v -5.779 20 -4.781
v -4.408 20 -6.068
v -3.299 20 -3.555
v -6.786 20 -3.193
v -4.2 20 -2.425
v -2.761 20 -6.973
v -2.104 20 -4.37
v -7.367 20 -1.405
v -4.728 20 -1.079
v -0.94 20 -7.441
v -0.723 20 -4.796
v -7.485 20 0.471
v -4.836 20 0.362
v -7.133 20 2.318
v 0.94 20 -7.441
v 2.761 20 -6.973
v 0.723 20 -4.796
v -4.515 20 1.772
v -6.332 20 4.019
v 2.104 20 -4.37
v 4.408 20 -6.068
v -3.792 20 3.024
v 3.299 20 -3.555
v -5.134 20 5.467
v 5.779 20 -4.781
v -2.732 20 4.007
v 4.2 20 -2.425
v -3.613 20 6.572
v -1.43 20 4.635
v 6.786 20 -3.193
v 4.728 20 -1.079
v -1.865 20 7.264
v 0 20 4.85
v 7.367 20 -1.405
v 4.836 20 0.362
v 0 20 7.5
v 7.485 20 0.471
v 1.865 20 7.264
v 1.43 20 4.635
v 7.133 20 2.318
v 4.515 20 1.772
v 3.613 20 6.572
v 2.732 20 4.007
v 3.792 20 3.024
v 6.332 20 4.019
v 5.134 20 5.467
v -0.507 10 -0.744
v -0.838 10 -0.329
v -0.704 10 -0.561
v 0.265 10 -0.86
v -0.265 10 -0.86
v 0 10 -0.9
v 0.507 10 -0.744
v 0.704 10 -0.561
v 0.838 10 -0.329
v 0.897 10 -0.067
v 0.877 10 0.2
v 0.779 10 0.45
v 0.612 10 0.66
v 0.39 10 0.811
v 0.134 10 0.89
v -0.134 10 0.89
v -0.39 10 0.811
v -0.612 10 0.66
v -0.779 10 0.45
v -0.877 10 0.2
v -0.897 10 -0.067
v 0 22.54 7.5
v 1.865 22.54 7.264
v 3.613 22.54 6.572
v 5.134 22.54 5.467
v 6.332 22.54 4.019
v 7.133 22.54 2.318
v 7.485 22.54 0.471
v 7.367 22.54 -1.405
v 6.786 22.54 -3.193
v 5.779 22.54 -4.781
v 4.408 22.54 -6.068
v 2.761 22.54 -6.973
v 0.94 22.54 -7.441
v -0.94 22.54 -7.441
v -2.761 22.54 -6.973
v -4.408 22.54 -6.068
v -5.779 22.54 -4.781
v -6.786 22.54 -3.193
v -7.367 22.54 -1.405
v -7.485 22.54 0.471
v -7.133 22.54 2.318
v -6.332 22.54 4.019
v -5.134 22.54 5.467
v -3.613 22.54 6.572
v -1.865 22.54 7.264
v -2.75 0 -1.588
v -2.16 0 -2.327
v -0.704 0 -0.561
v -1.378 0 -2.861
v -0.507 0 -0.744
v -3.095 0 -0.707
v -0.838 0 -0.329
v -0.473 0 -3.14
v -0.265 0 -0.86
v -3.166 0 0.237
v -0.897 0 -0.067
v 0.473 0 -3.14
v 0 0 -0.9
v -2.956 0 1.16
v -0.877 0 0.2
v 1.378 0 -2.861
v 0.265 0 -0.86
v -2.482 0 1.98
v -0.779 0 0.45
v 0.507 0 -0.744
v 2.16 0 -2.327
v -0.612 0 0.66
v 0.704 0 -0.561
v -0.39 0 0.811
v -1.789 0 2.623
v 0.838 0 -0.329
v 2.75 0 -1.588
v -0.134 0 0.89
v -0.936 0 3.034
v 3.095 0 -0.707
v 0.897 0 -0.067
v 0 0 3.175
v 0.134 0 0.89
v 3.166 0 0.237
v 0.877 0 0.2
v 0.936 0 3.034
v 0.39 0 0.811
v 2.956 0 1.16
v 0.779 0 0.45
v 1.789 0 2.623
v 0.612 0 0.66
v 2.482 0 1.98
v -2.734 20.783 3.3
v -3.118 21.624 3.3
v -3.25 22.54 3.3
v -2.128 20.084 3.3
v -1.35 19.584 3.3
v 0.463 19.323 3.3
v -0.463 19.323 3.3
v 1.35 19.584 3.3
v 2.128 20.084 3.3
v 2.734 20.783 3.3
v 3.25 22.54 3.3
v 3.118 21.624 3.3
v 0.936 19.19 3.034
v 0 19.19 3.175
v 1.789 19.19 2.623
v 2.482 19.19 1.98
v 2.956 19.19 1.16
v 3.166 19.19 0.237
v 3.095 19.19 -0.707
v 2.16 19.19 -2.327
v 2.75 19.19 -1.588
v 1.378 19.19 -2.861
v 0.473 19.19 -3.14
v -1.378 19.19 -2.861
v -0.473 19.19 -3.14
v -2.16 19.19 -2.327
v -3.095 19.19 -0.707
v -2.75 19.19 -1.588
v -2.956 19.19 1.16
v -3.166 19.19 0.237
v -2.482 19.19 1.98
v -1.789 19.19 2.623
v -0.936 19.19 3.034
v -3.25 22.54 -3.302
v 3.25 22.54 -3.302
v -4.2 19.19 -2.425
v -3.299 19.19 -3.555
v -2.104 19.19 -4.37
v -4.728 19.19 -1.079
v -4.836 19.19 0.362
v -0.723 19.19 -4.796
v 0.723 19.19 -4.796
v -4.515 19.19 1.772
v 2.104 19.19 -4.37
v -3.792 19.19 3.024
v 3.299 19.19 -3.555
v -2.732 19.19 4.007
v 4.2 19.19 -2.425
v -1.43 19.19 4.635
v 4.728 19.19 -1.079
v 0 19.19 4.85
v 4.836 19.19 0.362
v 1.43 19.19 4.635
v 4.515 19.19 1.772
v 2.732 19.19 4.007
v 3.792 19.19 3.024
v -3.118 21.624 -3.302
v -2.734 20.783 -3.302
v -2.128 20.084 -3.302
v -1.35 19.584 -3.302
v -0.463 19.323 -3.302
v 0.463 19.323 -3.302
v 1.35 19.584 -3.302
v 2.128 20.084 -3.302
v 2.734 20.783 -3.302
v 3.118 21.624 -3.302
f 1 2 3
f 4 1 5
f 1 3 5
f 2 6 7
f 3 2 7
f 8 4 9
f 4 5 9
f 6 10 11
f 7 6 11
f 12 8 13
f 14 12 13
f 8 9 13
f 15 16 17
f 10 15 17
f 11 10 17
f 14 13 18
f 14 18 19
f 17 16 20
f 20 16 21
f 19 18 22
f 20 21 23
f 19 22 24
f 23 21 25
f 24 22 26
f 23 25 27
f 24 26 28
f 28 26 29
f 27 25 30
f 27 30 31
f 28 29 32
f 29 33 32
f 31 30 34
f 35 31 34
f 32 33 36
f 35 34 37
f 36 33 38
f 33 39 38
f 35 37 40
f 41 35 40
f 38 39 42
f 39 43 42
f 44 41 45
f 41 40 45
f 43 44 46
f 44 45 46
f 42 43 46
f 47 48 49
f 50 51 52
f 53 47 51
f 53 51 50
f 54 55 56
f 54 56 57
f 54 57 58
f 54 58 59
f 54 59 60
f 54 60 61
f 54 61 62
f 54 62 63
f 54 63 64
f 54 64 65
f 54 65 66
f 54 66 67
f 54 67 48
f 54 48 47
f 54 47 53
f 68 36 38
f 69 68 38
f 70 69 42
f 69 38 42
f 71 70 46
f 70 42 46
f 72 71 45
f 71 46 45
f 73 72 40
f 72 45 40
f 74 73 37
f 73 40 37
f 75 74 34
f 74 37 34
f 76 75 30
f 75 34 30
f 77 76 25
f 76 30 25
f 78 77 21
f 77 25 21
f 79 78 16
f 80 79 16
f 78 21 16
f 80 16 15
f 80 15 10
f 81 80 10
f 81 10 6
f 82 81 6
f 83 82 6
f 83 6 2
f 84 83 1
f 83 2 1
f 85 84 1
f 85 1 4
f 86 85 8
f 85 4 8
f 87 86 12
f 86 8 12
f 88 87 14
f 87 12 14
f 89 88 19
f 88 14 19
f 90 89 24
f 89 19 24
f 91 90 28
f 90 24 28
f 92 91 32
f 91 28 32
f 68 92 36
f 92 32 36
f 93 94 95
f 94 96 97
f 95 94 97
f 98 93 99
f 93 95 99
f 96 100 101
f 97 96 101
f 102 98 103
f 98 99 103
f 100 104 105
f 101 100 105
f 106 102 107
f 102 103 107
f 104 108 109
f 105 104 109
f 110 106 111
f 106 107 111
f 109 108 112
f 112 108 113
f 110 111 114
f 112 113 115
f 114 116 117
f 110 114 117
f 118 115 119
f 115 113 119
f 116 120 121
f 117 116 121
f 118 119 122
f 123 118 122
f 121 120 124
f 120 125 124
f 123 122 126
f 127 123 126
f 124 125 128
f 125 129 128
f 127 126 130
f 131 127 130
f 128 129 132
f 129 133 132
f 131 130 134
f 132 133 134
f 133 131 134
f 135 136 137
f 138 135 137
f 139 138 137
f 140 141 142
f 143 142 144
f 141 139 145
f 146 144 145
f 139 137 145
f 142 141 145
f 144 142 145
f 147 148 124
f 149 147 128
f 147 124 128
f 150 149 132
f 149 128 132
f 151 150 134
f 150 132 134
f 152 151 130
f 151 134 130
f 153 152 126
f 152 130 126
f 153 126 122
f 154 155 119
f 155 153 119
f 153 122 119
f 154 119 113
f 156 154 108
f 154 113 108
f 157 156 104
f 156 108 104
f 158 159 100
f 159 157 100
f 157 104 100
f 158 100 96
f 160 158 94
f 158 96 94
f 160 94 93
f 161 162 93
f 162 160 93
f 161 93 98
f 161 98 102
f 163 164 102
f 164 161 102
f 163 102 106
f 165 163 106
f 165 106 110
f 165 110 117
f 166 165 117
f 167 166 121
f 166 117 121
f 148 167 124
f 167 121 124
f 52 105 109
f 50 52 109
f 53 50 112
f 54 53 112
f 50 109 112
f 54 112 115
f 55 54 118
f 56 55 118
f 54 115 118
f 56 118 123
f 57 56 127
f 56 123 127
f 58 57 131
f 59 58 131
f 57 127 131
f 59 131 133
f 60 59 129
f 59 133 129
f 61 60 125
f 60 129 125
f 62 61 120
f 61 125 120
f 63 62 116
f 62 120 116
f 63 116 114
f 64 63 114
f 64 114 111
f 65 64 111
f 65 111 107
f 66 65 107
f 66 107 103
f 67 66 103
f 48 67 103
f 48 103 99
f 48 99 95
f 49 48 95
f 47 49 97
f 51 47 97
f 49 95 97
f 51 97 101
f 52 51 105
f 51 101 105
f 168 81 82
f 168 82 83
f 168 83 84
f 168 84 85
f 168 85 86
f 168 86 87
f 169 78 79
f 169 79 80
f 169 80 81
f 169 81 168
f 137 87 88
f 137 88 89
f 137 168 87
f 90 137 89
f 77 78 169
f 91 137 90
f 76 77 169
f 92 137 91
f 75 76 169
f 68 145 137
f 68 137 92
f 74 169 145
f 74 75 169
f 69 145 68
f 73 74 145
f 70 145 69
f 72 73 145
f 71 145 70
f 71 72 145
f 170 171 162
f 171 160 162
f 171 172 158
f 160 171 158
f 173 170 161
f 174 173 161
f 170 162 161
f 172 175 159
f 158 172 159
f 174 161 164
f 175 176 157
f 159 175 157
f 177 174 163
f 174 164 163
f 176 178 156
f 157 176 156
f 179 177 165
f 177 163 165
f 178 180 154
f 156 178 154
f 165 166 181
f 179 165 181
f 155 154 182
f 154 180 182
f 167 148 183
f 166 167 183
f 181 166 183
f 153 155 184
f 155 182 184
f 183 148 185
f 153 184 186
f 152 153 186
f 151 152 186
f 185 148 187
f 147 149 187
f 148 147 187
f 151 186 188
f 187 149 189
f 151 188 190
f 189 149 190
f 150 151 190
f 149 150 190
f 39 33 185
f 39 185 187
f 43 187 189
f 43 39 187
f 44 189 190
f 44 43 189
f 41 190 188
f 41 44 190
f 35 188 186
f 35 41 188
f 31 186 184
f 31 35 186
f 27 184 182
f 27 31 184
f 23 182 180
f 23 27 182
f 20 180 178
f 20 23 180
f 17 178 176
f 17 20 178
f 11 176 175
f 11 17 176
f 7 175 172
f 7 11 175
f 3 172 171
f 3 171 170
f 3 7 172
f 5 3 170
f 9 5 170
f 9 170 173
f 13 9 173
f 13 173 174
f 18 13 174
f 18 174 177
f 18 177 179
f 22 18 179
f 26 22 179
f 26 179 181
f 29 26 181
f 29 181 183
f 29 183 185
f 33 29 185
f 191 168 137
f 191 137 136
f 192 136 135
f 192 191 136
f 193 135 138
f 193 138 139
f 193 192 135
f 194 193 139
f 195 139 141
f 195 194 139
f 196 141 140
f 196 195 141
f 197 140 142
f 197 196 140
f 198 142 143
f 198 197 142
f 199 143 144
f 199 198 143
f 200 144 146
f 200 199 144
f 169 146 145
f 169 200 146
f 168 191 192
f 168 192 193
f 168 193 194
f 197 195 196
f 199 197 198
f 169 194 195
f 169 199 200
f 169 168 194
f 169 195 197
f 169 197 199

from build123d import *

# Parameters (mm, degrees)
SKETCH1_R               = 3.175
BOSS_EXTRUDE1_DEPTH     = 20
SKETCH2_R               = 0.9
CUT_EXTRUDE1_DEPTH      = 10
SKETCH4_R               = 7.5
BOSS_EXTRUDE2_DEPTH     = 2.54
SKETCH6_R               = 4.85
BOSS_EXTRUDE3_DEPTH     = 3.35
CUT_EXTRUDE3_DEPTH      = 3.3
CUT_EXTRUDE3_DEPTH_BACK = 3.302
SKETCH5_R               = 3.25


with BuildPart() as part:
    # Sketch1 → Boss-Extrude1 (new body)
    with BuildSketch(Plane(origin=(0, 0, 0), x_dir=(1, 0, 0), z_dir=(0, 1, 0))):
        with Locations(Location((0, 0, 0), (0, 0, 270))):
            Circle(SKETCH1_R)
    extrude(amount=BOSS_EXTRUDE1_DEPTH)

    # Sketch2 → Cut-Extrude1 (cut)
    with BuildSketch(Plane.XZ):
        with Locations(Location((0, 0, 0), (0, 0, 270))):
            Circle(SKETCH2_R)
    extrude(amount=-CUT_EXTRUDE1_DEPTH, mode=Mode.SUBTRACT)

    # Sketch4 → Boss-Extrude2 (add)
    with BuildSketch(Plane(origin=(0, 20, 0), x_dir=(1, 0, 0), z_dir=(0, 1, 0))):
        with Locations(Location((0, 0, 0), (0, 0, 270))):
            Circle(SKETCH4_R)
    extrude(amount=BOSS_EXTRUDE2_DEPTH)

    # Sketch6 → Boss-Extrude3 (add)
    with BuildSketch(Plane(origin=(0, 22.54, 0), x_dir=(1, 0, 0), z_dir=(0, 1, 0))):
        with Locations(Location((0, 0, 0), (0, 0, 270))):
            Circle(SKETCH6_R)
    extrude(amount=-BOSS_EXTRUDE3_DEPTH)

    # Sketch5 → Cut-Extrude3 (cut, two sides: drawn at the far end of the back side and taken through both)
    with BuildSketch(Plane.XY.offset(-CUT_EXTRUDE3_DEPTH_BACK)):
        with Locations((0, 22.54)):
            Circle(SKETCH5_R)
    extrude(amount=CUT_EXTRUDE3_DEPTH + CUT_EXTRUDE3_DEPTH_BACK, mode=Mode.SUBTRACT)


solid = part.part
